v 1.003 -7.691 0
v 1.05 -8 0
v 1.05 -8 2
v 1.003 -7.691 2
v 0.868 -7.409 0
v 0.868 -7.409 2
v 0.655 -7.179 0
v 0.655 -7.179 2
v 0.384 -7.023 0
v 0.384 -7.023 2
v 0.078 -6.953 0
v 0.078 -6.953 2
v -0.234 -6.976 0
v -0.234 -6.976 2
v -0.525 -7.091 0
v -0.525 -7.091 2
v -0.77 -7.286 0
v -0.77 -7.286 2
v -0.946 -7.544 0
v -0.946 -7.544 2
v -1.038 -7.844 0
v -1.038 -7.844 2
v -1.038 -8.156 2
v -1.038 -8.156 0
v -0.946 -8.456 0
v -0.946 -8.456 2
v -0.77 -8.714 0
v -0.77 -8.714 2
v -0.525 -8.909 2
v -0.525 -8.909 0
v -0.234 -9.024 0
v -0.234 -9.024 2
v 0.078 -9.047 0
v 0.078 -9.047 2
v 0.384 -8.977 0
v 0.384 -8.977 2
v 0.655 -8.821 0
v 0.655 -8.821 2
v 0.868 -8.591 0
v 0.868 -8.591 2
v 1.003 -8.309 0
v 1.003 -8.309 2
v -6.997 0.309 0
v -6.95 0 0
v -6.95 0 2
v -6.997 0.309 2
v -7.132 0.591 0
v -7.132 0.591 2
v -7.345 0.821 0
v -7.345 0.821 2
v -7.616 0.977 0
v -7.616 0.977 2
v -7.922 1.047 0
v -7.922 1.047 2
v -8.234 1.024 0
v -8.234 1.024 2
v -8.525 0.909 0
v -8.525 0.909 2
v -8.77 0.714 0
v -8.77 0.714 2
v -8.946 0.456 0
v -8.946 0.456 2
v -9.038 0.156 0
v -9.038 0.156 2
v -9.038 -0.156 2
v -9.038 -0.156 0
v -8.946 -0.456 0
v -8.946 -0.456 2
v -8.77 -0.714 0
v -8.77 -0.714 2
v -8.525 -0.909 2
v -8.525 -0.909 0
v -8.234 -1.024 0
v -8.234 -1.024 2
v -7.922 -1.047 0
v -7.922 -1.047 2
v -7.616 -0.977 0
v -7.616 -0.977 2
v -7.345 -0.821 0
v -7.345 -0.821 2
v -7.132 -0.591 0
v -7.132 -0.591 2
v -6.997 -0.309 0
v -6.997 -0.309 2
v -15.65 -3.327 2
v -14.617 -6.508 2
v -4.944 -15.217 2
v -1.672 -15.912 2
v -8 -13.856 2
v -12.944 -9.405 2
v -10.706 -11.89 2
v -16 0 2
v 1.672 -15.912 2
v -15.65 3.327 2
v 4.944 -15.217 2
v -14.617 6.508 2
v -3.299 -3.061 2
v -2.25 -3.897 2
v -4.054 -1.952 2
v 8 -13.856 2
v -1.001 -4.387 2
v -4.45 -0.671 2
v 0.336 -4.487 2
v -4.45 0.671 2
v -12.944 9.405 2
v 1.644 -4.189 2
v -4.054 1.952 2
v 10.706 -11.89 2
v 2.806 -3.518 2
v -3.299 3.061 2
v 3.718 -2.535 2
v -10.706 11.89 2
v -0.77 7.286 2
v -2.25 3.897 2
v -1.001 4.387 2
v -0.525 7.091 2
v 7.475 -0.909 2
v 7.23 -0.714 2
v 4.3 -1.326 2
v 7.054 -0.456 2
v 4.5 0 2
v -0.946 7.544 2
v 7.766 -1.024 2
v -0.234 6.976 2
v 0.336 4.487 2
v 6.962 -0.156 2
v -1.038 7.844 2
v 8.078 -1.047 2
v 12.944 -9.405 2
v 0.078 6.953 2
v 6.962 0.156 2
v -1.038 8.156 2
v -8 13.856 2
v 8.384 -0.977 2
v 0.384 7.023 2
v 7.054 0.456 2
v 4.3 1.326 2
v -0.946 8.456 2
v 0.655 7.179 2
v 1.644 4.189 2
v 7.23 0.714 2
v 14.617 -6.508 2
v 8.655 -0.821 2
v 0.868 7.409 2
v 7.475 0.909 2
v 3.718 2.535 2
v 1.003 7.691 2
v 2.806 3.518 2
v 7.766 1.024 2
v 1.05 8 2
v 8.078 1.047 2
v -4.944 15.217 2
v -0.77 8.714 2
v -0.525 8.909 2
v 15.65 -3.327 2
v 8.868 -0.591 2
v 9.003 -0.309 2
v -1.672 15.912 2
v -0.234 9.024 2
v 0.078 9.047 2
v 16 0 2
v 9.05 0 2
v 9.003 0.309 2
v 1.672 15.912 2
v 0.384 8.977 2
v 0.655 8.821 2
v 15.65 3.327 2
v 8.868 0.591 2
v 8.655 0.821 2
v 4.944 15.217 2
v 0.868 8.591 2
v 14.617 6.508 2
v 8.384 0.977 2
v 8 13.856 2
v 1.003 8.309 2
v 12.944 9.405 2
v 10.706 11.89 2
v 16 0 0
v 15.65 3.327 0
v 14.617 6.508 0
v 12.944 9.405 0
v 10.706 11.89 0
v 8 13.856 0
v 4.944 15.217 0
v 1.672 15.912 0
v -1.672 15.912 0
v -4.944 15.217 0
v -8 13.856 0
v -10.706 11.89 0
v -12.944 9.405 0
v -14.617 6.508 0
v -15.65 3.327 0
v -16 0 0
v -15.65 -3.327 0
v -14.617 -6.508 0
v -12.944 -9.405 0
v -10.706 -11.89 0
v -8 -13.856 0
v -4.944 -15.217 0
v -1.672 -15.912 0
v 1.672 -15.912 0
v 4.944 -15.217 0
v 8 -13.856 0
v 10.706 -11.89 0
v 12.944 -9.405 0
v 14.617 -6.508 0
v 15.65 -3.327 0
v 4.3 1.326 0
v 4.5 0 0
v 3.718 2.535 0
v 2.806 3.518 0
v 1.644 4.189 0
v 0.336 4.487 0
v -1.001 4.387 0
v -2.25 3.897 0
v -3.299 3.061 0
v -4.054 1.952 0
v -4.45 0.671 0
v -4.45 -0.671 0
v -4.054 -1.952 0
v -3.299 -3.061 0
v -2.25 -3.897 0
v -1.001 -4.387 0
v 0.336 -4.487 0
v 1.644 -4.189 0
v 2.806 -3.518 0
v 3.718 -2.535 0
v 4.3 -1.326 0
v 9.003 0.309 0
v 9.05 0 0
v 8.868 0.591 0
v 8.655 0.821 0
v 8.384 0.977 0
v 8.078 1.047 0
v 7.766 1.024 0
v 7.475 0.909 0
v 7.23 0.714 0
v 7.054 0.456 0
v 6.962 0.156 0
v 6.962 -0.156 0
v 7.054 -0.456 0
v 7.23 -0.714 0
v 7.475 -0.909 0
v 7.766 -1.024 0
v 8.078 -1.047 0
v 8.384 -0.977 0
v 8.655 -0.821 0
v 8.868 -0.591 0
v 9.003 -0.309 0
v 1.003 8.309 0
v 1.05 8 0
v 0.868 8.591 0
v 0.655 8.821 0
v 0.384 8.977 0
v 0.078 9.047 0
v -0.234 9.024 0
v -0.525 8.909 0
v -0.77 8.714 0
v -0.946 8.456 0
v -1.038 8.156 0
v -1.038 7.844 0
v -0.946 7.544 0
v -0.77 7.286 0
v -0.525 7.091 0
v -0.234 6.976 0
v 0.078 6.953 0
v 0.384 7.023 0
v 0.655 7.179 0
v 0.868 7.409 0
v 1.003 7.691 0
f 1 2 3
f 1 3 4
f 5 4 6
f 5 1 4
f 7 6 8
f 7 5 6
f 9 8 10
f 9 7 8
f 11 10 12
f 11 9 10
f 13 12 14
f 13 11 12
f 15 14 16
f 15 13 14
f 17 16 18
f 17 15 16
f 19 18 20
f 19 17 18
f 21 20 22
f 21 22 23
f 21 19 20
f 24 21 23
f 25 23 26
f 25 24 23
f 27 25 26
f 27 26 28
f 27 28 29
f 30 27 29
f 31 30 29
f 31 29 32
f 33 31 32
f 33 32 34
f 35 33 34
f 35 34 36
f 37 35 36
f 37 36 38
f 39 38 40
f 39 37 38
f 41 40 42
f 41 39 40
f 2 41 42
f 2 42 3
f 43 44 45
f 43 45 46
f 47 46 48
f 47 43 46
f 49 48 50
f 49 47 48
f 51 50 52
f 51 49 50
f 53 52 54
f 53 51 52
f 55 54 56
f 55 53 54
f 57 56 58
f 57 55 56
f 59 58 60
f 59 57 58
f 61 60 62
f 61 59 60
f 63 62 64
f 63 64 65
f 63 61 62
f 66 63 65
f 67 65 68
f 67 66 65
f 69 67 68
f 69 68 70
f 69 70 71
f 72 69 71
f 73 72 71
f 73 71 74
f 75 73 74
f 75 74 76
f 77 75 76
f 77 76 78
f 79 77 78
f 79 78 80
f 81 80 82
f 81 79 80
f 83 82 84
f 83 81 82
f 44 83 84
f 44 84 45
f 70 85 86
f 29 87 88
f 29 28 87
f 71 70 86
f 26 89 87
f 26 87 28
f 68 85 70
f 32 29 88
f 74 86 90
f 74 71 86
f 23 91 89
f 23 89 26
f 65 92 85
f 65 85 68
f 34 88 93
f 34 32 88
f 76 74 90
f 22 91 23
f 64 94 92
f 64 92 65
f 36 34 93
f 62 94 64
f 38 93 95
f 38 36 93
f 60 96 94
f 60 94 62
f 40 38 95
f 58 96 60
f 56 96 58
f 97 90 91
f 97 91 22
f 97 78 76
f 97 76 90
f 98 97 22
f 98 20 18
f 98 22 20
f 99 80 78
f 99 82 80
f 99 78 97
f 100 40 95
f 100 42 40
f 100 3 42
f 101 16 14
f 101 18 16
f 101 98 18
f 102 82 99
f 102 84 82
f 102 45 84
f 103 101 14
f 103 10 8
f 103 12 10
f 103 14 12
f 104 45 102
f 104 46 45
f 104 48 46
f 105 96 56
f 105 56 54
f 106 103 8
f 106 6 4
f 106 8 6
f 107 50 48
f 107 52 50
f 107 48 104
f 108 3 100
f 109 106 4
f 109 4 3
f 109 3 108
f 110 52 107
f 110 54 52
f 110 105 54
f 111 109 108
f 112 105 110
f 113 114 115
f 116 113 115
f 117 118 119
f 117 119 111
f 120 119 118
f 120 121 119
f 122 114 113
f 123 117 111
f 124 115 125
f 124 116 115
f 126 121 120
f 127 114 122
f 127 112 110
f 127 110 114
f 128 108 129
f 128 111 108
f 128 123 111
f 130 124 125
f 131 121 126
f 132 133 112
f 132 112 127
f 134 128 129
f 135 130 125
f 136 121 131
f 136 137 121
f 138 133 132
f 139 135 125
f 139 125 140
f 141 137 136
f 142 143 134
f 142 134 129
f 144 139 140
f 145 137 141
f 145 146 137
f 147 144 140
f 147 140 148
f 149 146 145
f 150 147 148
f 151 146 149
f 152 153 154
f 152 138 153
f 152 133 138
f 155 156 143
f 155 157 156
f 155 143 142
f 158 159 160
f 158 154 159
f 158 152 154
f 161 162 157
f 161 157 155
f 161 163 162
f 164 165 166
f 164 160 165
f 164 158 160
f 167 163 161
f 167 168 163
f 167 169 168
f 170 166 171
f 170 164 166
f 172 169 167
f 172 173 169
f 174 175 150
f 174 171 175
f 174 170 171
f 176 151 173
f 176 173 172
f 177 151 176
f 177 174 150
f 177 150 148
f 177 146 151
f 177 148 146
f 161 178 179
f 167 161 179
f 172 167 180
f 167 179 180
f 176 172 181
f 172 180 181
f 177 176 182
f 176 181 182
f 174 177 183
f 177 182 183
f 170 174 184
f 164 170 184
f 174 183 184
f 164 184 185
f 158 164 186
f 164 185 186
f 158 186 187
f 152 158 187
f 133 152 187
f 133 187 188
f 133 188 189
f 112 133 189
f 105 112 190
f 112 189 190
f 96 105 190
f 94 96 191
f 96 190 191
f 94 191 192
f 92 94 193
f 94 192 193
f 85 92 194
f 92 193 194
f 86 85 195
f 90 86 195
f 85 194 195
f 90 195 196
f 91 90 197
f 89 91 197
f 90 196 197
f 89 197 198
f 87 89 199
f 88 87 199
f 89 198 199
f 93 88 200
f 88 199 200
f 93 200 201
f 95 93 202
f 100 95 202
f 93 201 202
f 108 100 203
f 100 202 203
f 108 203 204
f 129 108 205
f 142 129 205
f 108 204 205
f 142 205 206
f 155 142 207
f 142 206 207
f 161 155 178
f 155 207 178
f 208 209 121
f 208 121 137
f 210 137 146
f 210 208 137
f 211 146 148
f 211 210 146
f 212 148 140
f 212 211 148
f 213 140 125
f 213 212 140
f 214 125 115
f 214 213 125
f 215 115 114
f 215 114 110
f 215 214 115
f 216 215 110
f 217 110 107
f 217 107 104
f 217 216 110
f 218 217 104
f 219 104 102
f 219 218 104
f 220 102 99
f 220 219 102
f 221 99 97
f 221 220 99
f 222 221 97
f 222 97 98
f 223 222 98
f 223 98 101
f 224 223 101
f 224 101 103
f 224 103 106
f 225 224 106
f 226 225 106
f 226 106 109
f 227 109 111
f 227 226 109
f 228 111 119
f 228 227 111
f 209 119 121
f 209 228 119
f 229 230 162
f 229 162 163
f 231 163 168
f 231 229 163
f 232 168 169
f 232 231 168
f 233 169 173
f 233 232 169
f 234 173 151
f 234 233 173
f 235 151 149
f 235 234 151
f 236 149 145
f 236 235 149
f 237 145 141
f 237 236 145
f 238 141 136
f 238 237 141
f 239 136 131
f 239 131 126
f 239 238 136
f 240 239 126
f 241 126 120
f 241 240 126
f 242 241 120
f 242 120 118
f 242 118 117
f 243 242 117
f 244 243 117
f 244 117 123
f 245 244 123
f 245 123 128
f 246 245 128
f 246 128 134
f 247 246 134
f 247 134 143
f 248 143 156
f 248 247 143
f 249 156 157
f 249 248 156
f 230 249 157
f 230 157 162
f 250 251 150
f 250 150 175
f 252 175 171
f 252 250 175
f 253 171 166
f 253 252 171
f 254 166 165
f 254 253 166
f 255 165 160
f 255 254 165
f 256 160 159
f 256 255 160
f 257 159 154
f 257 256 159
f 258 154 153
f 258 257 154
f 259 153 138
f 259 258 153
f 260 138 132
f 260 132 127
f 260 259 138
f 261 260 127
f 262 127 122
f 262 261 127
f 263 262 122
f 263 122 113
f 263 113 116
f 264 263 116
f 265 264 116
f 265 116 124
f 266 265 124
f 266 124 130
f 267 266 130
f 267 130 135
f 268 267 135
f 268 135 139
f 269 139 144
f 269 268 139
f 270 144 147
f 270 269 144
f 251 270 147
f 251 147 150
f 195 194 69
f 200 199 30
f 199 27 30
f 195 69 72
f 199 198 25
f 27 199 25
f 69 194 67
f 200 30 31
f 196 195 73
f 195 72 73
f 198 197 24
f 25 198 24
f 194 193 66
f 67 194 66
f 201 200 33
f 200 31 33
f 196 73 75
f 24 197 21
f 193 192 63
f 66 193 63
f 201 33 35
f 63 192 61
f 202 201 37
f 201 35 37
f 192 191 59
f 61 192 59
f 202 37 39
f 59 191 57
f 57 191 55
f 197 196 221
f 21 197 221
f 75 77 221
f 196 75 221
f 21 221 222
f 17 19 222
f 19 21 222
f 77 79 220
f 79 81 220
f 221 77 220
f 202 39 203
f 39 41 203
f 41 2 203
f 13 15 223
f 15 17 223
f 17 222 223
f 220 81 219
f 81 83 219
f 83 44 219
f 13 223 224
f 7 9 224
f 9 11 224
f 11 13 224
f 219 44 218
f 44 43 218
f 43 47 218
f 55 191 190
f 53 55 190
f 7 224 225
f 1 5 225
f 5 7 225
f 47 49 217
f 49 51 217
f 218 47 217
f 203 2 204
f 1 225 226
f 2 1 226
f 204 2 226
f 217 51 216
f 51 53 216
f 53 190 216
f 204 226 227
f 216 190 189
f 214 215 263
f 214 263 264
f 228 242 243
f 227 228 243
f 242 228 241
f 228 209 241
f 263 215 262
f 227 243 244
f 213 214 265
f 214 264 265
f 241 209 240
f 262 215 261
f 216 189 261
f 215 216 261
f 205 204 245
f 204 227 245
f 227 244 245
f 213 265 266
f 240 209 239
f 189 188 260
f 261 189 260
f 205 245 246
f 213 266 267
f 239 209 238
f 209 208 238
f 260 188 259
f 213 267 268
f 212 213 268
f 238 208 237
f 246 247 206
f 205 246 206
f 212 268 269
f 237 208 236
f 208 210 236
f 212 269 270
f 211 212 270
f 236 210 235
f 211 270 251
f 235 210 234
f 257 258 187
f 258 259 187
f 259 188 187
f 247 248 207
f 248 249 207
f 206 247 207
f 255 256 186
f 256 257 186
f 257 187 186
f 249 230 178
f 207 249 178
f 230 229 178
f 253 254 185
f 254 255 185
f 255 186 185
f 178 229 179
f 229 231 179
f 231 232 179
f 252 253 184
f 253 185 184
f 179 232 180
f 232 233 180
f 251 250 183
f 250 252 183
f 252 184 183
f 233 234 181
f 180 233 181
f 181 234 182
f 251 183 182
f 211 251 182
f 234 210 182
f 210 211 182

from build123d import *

# Parameters (mm, degrees)
SKETCH1_R           = 16
SKETCH1_R_2         = 4.5
SKETCH1_R_3         = 1.05
BOSS_EXTRUDE1_DEPTH = 2


with BuildPart() as part:
    # Sketch1 → Boss-Extrude1 (new body)
    with BuildSketch(Plane.XY):
        Circle(SKETCH1_R)
        Circle(SKETCH1_R_2, mode=Mode.SUBTRACT)
        with Locations((0, 8)):
            Circle(SKETCH1_R_3, mode=Mode.SUBTRACT)
        with Locations((8, 0)):
            Circle(SKETCH1_R_3, mode=Mode.SUBTRACT)
        with Locations((0, -8)):
            Circle(SKETCH1_R_3, mode=Mode.SUBTRACT)
        with Locations((-8, 0)):
            Circle(SKETCH1_R_3, mode=Mode.SUBTRACT)
    extrude(amount=BOSS_EXTRUDE1_DEPTH)


solid = part.part
